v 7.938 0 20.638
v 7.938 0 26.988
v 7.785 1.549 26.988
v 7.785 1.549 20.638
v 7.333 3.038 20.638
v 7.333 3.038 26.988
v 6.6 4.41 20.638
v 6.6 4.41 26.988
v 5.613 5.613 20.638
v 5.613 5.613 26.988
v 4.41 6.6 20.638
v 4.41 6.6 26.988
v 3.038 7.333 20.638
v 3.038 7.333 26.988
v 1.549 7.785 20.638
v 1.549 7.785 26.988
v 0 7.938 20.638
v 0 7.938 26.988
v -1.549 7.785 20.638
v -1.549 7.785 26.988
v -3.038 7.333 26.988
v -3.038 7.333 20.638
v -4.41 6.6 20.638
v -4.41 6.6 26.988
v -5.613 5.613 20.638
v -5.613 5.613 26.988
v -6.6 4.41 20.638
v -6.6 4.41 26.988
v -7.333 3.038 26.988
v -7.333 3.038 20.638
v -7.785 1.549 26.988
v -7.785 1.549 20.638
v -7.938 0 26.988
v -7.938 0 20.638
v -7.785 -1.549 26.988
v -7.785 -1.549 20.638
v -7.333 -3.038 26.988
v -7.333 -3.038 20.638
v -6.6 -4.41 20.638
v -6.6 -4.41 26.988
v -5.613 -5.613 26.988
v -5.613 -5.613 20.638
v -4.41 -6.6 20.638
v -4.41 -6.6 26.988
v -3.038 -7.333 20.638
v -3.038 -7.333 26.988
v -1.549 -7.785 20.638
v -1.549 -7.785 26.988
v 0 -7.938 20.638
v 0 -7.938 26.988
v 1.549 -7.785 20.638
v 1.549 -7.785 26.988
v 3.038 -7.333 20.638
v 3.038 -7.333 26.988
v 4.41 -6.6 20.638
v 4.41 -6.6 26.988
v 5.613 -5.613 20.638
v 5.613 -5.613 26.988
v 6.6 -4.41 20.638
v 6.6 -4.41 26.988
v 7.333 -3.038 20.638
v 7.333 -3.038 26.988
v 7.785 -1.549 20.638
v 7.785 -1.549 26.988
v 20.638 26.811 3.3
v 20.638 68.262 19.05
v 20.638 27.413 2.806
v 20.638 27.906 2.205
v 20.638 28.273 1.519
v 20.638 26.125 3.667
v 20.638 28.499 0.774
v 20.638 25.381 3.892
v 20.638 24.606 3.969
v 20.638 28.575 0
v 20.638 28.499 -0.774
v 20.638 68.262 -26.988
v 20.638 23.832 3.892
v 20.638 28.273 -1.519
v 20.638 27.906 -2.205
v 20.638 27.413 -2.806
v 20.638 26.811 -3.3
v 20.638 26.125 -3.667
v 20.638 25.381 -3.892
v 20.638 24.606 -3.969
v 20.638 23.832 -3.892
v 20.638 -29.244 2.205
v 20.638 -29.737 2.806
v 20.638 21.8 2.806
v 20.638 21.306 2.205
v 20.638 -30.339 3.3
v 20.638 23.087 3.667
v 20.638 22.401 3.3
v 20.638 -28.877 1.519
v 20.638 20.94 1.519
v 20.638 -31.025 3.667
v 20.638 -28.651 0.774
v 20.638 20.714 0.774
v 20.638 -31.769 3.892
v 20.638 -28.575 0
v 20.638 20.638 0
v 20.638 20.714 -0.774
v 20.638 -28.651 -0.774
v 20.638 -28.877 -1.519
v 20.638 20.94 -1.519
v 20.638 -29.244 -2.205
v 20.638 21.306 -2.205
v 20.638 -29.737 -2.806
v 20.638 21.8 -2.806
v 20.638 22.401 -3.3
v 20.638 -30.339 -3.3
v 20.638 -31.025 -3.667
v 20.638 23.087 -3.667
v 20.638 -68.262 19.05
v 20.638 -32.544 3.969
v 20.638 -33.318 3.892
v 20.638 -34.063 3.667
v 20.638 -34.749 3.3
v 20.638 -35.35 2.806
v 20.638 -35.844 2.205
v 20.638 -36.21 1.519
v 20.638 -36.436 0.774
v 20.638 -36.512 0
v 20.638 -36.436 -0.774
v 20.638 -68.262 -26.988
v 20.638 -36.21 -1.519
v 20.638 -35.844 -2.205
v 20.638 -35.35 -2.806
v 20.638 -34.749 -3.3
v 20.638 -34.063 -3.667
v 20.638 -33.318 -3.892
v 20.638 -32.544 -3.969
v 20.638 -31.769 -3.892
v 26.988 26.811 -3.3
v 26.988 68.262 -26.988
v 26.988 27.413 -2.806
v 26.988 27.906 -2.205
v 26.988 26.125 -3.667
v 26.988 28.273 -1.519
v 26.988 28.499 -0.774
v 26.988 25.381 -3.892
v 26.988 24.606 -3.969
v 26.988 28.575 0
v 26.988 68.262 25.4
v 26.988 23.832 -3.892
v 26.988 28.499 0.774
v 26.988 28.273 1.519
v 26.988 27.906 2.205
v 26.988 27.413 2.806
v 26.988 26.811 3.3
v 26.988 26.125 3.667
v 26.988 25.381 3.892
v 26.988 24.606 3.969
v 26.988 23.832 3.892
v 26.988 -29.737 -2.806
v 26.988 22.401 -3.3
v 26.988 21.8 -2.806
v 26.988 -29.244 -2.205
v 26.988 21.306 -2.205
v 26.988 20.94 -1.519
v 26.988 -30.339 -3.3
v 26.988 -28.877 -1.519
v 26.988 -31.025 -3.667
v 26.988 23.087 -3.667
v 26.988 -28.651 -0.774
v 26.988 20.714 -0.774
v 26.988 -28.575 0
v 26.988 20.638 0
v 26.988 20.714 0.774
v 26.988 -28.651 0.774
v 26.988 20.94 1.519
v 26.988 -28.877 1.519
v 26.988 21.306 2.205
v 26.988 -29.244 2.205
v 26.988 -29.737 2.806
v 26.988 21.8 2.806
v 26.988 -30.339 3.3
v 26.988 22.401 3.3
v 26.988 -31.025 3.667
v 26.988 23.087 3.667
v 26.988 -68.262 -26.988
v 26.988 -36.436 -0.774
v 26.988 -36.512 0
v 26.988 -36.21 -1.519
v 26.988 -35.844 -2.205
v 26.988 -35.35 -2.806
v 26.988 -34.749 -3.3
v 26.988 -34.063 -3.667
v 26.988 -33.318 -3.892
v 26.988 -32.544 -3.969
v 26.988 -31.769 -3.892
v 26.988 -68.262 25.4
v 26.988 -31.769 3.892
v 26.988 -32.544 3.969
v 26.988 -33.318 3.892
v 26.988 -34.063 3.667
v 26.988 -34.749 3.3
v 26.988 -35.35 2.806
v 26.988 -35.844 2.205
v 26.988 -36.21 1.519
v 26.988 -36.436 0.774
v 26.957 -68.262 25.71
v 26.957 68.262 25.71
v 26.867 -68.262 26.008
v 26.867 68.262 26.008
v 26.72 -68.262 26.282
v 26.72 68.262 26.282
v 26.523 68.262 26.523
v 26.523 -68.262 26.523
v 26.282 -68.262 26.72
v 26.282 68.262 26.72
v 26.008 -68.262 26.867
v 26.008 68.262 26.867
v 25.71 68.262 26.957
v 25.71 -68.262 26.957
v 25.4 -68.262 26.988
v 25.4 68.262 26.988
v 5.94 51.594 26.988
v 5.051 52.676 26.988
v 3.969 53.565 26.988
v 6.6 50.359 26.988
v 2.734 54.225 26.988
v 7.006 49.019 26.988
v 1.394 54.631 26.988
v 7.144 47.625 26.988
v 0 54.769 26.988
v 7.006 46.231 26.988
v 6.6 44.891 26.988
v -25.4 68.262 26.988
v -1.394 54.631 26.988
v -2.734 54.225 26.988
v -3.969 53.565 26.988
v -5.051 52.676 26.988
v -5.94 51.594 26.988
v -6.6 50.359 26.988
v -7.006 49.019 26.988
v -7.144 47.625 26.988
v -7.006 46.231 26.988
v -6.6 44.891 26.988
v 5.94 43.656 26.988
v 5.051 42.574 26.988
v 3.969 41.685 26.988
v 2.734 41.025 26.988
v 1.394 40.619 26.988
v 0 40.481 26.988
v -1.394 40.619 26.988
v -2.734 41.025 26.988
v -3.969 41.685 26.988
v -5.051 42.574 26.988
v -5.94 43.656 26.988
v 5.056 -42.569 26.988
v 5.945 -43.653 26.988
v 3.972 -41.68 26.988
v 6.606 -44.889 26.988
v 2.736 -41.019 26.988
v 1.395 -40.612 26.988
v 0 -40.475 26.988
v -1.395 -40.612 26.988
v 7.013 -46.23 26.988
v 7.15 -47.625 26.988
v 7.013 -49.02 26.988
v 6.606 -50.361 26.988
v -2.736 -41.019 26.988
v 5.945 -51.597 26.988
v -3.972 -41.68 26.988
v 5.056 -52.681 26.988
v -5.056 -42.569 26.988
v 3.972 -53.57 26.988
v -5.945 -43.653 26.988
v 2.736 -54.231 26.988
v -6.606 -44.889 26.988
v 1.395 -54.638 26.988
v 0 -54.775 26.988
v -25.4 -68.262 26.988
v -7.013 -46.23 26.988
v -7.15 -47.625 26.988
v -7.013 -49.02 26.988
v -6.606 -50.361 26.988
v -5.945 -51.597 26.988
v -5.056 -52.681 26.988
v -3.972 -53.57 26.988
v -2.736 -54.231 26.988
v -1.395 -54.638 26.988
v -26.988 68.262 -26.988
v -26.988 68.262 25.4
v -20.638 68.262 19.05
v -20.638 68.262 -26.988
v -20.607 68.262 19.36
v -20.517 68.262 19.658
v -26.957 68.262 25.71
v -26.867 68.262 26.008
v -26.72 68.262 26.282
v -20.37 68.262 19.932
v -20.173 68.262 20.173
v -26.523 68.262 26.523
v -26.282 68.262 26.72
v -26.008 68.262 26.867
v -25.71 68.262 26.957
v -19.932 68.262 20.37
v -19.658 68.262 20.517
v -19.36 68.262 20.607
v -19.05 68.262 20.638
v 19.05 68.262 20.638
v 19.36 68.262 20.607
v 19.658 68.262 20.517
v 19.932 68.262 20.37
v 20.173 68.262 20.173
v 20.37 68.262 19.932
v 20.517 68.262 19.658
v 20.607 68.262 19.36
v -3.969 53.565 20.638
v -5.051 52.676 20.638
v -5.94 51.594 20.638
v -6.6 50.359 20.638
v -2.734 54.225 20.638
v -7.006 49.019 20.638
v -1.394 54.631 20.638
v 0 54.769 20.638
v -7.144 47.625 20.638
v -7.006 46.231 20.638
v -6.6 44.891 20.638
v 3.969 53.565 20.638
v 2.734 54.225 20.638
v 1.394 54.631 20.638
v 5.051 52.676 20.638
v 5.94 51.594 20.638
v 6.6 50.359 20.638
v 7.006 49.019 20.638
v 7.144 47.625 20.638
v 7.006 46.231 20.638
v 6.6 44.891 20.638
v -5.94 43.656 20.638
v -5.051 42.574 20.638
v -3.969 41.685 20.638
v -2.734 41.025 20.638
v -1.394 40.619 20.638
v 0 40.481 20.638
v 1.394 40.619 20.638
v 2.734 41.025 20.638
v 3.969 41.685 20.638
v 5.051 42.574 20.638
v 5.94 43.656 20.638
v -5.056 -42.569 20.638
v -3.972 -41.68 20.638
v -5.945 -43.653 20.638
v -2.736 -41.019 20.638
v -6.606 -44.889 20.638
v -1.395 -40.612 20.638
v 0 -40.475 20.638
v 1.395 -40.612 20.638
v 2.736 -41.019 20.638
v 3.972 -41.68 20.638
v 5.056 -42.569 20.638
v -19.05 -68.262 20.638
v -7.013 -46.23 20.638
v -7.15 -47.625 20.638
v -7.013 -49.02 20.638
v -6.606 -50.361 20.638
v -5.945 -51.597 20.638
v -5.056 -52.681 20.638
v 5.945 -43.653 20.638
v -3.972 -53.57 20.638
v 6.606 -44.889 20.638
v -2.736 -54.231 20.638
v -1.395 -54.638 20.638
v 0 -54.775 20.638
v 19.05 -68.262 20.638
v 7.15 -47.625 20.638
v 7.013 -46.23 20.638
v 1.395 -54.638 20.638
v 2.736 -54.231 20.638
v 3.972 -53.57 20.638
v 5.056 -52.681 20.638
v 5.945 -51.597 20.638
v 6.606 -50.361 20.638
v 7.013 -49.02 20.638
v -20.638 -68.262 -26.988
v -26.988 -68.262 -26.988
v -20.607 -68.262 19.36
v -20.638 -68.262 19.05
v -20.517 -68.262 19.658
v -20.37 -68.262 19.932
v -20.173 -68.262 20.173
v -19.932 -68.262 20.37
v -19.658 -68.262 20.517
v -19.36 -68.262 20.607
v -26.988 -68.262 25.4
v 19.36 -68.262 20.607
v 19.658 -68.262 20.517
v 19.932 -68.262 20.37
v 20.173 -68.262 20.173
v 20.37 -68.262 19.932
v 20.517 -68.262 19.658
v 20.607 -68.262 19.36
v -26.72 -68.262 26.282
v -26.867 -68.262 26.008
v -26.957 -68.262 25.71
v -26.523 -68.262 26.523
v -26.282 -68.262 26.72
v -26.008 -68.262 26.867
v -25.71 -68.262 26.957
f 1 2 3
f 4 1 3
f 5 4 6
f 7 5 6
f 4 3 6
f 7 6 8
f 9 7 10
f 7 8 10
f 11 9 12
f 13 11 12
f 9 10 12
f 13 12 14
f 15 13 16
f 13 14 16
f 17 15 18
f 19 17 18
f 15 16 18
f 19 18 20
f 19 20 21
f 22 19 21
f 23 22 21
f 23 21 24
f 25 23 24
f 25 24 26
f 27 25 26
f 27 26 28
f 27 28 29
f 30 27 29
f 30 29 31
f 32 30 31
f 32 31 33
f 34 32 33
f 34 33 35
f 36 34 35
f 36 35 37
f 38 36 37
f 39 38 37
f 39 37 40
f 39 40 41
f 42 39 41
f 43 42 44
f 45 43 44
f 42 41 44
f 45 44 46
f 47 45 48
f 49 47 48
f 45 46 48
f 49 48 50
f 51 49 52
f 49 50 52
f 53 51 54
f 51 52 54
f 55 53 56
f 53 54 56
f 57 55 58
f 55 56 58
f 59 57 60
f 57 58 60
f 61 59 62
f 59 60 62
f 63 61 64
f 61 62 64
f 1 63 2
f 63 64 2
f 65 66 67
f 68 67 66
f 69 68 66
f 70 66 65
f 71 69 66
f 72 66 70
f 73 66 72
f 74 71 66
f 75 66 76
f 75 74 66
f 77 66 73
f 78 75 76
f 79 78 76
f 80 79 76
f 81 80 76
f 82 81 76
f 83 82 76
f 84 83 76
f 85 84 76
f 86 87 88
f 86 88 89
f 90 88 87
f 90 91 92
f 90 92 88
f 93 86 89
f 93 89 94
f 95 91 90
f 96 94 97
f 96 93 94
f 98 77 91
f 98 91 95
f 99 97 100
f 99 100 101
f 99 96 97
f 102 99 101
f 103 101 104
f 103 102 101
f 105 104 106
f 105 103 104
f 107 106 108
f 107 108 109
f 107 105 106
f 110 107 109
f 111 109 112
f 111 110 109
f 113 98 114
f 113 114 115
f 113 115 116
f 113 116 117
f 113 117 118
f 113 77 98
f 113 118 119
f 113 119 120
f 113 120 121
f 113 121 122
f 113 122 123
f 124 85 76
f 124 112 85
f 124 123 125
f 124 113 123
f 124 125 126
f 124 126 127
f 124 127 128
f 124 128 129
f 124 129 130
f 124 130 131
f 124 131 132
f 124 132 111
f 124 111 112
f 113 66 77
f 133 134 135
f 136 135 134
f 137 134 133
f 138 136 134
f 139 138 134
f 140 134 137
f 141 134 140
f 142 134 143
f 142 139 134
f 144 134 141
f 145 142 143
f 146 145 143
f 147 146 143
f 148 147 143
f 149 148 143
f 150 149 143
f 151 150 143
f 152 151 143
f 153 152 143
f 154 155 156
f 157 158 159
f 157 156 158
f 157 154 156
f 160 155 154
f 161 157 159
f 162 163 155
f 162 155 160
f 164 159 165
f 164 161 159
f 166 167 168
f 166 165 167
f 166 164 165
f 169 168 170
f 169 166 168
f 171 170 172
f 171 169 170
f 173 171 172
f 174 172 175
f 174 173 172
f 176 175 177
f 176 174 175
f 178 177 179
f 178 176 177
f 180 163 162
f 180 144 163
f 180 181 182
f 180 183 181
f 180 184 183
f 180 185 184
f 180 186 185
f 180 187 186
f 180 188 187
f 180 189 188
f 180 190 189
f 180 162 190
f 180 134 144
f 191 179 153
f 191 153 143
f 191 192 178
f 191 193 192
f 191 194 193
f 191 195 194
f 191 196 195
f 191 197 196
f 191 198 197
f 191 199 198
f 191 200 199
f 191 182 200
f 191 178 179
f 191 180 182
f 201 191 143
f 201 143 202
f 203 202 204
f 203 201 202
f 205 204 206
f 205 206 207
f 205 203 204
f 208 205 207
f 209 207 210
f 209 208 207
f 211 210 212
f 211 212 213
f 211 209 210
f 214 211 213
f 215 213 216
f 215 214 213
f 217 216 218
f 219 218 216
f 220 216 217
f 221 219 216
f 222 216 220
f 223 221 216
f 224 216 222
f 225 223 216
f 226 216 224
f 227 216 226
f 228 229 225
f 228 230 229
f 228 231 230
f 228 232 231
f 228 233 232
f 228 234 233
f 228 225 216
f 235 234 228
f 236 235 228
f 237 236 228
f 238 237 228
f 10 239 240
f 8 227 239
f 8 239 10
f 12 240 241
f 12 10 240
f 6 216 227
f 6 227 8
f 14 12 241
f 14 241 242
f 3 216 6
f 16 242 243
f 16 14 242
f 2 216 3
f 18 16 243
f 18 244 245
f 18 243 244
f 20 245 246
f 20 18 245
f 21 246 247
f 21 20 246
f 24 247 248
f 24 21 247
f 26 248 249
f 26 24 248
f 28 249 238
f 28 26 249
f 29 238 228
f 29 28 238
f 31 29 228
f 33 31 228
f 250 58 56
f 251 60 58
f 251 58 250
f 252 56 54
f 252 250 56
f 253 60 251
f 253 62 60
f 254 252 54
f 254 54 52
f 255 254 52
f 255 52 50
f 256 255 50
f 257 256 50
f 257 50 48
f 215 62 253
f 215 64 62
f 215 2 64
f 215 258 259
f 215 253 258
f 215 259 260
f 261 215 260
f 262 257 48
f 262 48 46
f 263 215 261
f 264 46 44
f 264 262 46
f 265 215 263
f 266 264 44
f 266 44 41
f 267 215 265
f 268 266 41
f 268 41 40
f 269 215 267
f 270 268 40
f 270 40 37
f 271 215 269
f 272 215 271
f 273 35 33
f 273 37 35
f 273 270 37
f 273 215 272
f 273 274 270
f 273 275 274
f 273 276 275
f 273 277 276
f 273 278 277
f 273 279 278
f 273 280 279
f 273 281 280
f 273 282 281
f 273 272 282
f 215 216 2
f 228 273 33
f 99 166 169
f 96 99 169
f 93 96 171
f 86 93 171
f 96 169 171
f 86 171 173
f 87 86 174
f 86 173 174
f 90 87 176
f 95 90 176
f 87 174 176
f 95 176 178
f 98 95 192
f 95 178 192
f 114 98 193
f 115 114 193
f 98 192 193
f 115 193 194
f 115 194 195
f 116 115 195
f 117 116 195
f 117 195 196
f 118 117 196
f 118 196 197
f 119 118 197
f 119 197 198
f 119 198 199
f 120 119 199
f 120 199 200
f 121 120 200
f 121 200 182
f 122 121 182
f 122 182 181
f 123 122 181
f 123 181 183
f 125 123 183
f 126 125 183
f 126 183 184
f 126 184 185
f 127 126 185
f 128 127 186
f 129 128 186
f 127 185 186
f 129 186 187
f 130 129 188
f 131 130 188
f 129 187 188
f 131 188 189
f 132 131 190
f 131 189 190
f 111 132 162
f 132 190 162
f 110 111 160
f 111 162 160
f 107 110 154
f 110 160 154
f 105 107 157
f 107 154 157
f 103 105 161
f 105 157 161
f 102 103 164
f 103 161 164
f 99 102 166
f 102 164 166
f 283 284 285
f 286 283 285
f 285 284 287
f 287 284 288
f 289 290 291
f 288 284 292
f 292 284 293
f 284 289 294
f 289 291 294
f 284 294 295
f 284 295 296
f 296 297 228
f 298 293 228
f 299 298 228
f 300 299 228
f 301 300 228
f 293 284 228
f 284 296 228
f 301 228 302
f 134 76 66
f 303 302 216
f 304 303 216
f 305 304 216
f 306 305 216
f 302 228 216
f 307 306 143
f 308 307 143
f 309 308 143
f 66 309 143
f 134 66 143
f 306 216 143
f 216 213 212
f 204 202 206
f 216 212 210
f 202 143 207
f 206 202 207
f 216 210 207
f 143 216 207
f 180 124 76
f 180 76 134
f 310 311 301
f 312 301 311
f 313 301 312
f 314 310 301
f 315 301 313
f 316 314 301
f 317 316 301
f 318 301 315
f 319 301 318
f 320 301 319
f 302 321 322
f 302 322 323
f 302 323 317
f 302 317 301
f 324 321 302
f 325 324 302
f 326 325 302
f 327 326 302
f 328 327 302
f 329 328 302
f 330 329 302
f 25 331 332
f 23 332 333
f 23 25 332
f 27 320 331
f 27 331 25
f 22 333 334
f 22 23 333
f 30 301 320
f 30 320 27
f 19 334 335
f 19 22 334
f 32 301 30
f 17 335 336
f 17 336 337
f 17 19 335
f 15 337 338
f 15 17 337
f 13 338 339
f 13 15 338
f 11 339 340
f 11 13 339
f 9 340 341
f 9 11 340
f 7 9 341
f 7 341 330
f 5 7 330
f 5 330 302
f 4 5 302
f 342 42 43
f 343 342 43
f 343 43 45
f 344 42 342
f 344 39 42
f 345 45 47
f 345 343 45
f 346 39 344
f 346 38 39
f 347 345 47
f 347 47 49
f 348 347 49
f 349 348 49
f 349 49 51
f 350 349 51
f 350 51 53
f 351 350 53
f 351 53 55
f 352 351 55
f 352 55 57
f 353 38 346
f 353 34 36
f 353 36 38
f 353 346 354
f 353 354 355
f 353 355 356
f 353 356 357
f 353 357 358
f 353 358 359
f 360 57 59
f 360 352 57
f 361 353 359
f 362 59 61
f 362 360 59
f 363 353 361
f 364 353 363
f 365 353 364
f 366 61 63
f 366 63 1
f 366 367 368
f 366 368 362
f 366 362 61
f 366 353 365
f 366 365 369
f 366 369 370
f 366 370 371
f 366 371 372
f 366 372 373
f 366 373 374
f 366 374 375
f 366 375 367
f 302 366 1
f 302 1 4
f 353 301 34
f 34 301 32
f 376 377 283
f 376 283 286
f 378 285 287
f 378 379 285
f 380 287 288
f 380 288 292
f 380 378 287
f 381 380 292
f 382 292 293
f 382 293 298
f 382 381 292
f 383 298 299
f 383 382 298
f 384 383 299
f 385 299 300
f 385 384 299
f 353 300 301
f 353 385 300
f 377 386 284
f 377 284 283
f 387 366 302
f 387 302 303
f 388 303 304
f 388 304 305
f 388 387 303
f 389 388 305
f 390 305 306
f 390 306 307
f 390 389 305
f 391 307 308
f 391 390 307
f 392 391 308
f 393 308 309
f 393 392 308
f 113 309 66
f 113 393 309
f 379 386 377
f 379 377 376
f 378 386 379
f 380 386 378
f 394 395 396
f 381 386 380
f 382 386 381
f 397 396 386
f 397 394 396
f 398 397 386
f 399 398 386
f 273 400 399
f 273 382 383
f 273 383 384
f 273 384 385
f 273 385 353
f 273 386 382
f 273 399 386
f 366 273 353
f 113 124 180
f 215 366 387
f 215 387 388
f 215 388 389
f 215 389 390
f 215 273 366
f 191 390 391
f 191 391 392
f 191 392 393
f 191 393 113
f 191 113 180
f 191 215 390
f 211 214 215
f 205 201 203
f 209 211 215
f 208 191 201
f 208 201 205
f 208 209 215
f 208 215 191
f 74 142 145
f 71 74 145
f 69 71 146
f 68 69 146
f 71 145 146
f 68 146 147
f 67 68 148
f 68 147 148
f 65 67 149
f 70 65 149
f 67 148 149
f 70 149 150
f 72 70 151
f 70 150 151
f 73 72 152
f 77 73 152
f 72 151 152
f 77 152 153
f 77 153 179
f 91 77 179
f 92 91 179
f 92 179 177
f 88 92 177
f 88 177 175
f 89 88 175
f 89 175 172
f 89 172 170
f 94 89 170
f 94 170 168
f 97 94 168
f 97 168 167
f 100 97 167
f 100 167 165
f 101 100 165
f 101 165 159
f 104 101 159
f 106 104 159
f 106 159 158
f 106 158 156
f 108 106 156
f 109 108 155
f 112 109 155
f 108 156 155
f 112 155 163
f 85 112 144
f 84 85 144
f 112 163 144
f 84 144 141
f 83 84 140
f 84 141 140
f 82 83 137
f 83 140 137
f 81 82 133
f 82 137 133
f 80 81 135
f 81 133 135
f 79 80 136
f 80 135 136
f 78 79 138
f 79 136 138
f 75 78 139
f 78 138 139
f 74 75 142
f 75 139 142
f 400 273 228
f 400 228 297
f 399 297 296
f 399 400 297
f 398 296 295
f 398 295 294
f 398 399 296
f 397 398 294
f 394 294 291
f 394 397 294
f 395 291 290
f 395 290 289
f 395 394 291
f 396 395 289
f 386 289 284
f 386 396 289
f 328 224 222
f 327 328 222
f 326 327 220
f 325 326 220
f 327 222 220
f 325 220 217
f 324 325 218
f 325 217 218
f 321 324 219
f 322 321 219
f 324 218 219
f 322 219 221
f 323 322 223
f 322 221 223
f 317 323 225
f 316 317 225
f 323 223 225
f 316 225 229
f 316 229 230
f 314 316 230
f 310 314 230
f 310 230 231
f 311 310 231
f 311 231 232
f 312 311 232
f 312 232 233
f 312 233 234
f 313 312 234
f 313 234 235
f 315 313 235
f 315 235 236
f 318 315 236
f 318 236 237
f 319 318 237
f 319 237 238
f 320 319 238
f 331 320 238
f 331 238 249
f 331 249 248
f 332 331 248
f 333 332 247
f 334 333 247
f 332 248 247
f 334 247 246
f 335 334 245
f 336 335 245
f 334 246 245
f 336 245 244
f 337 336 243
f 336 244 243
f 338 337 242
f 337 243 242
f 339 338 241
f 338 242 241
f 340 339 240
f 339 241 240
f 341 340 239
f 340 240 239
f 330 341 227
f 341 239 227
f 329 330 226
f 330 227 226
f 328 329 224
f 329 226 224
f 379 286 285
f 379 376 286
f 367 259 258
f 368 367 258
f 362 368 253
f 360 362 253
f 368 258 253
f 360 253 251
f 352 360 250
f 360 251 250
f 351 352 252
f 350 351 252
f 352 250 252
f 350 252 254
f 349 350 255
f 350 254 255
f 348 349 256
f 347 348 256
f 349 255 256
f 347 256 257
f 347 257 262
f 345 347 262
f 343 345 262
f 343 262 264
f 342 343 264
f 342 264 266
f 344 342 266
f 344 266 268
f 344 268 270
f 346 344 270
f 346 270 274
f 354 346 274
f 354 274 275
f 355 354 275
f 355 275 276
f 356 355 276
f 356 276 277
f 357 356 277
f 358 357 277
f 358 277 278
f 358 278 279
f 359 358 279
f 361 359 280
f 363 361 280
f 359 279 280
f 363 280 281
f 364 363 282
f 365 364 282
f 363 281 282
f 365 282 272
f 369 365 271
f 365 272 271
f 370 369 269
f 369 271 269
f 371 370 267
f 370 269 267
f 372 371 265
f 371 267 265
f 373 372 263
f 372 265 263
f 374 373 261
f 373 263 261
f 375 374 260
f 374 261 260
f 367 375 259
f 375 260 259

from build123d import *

# Parameters (mm, degrees)
F1_DEPTH = 68.2625
F2_R     = 7.9375
F2_R_2   = 7.14375
F2_R_3   = 7.1501
F3_DEPTH = 25.4
F4_R     = 3.96875
F5_DEPTH = 25.4


with BuildPart() as f1:
    # F0 (on Front) → F1 (new body, symmetric)
    with BuildSketch(Plane.XZ):
        with BuildLine():
            Line((-19.05, 20.6375), (19.05, 20.6375))
            ThreePointArc((19.05, 20.6375), (20.172532, 20.172532), (20.6375, 19.05))
            Line((20.6375, 19.05), (20.6375, -20.6375))
            Line((20.6375, -20.6375), (20.6375, -26.9875))
            Line((20.6375, -26.9875), (26.9875, -26.9875))
            Line((26.9875, -26.9875), (26.9875, 25.4))
            ThreePointArc((26.9875, 25.4), (26.522532, 26.522532), (25.4, 26.9875))
            Line((25.4, 26.9875), (-25.4, 26.9875))
            ThreePointArc((-25.4, 26.9875), (-26.522532, 26.522532), (-26.9875, 25.4))
            Line((-26.9875, 25.4), (-26.9875, -26.9875))
            Line((-26.9875, -26.9875), (-20.6375, -26.9875))
            Line((-20.6375, -26.9875), (-20.6375, -20.6375))
            Line((-20.6375, -20.6375), (-20.6375, 19.05))
            ThreePointArc((-20.6375, 19.05), (-20.172532, 20.172532), (-19.05, 20.6375))
        make_face()
    extrude(amount=F1_DEPTH, both=True)

    # F2 (on face) → F3 (cut)
    with BuildSketch(Plane.XY.offset(26.9875)):
        Circle(F2_R)
        with Locations((0, 47.625)):
            Circle(F2_R_2)
        with Locations((0, -47.625)):
            Circle(F2_R_3)
    extrude(amount=-F3_DEPTH, mode=Mode.SUBTRACT)

    # F4 (on face) → F5 (cut)
    with BuildSketch(Plane.YZ.offset(26.9875)):
        with Locations((-32.54375, 0)):
            Circle(F4_R)
        with Locations((24.60625, 0)):
            Circle(F4_R)
    extrude(amount=-F5_DEPTH, mode=Mode.SUBTRACT)


solid = f1.part
